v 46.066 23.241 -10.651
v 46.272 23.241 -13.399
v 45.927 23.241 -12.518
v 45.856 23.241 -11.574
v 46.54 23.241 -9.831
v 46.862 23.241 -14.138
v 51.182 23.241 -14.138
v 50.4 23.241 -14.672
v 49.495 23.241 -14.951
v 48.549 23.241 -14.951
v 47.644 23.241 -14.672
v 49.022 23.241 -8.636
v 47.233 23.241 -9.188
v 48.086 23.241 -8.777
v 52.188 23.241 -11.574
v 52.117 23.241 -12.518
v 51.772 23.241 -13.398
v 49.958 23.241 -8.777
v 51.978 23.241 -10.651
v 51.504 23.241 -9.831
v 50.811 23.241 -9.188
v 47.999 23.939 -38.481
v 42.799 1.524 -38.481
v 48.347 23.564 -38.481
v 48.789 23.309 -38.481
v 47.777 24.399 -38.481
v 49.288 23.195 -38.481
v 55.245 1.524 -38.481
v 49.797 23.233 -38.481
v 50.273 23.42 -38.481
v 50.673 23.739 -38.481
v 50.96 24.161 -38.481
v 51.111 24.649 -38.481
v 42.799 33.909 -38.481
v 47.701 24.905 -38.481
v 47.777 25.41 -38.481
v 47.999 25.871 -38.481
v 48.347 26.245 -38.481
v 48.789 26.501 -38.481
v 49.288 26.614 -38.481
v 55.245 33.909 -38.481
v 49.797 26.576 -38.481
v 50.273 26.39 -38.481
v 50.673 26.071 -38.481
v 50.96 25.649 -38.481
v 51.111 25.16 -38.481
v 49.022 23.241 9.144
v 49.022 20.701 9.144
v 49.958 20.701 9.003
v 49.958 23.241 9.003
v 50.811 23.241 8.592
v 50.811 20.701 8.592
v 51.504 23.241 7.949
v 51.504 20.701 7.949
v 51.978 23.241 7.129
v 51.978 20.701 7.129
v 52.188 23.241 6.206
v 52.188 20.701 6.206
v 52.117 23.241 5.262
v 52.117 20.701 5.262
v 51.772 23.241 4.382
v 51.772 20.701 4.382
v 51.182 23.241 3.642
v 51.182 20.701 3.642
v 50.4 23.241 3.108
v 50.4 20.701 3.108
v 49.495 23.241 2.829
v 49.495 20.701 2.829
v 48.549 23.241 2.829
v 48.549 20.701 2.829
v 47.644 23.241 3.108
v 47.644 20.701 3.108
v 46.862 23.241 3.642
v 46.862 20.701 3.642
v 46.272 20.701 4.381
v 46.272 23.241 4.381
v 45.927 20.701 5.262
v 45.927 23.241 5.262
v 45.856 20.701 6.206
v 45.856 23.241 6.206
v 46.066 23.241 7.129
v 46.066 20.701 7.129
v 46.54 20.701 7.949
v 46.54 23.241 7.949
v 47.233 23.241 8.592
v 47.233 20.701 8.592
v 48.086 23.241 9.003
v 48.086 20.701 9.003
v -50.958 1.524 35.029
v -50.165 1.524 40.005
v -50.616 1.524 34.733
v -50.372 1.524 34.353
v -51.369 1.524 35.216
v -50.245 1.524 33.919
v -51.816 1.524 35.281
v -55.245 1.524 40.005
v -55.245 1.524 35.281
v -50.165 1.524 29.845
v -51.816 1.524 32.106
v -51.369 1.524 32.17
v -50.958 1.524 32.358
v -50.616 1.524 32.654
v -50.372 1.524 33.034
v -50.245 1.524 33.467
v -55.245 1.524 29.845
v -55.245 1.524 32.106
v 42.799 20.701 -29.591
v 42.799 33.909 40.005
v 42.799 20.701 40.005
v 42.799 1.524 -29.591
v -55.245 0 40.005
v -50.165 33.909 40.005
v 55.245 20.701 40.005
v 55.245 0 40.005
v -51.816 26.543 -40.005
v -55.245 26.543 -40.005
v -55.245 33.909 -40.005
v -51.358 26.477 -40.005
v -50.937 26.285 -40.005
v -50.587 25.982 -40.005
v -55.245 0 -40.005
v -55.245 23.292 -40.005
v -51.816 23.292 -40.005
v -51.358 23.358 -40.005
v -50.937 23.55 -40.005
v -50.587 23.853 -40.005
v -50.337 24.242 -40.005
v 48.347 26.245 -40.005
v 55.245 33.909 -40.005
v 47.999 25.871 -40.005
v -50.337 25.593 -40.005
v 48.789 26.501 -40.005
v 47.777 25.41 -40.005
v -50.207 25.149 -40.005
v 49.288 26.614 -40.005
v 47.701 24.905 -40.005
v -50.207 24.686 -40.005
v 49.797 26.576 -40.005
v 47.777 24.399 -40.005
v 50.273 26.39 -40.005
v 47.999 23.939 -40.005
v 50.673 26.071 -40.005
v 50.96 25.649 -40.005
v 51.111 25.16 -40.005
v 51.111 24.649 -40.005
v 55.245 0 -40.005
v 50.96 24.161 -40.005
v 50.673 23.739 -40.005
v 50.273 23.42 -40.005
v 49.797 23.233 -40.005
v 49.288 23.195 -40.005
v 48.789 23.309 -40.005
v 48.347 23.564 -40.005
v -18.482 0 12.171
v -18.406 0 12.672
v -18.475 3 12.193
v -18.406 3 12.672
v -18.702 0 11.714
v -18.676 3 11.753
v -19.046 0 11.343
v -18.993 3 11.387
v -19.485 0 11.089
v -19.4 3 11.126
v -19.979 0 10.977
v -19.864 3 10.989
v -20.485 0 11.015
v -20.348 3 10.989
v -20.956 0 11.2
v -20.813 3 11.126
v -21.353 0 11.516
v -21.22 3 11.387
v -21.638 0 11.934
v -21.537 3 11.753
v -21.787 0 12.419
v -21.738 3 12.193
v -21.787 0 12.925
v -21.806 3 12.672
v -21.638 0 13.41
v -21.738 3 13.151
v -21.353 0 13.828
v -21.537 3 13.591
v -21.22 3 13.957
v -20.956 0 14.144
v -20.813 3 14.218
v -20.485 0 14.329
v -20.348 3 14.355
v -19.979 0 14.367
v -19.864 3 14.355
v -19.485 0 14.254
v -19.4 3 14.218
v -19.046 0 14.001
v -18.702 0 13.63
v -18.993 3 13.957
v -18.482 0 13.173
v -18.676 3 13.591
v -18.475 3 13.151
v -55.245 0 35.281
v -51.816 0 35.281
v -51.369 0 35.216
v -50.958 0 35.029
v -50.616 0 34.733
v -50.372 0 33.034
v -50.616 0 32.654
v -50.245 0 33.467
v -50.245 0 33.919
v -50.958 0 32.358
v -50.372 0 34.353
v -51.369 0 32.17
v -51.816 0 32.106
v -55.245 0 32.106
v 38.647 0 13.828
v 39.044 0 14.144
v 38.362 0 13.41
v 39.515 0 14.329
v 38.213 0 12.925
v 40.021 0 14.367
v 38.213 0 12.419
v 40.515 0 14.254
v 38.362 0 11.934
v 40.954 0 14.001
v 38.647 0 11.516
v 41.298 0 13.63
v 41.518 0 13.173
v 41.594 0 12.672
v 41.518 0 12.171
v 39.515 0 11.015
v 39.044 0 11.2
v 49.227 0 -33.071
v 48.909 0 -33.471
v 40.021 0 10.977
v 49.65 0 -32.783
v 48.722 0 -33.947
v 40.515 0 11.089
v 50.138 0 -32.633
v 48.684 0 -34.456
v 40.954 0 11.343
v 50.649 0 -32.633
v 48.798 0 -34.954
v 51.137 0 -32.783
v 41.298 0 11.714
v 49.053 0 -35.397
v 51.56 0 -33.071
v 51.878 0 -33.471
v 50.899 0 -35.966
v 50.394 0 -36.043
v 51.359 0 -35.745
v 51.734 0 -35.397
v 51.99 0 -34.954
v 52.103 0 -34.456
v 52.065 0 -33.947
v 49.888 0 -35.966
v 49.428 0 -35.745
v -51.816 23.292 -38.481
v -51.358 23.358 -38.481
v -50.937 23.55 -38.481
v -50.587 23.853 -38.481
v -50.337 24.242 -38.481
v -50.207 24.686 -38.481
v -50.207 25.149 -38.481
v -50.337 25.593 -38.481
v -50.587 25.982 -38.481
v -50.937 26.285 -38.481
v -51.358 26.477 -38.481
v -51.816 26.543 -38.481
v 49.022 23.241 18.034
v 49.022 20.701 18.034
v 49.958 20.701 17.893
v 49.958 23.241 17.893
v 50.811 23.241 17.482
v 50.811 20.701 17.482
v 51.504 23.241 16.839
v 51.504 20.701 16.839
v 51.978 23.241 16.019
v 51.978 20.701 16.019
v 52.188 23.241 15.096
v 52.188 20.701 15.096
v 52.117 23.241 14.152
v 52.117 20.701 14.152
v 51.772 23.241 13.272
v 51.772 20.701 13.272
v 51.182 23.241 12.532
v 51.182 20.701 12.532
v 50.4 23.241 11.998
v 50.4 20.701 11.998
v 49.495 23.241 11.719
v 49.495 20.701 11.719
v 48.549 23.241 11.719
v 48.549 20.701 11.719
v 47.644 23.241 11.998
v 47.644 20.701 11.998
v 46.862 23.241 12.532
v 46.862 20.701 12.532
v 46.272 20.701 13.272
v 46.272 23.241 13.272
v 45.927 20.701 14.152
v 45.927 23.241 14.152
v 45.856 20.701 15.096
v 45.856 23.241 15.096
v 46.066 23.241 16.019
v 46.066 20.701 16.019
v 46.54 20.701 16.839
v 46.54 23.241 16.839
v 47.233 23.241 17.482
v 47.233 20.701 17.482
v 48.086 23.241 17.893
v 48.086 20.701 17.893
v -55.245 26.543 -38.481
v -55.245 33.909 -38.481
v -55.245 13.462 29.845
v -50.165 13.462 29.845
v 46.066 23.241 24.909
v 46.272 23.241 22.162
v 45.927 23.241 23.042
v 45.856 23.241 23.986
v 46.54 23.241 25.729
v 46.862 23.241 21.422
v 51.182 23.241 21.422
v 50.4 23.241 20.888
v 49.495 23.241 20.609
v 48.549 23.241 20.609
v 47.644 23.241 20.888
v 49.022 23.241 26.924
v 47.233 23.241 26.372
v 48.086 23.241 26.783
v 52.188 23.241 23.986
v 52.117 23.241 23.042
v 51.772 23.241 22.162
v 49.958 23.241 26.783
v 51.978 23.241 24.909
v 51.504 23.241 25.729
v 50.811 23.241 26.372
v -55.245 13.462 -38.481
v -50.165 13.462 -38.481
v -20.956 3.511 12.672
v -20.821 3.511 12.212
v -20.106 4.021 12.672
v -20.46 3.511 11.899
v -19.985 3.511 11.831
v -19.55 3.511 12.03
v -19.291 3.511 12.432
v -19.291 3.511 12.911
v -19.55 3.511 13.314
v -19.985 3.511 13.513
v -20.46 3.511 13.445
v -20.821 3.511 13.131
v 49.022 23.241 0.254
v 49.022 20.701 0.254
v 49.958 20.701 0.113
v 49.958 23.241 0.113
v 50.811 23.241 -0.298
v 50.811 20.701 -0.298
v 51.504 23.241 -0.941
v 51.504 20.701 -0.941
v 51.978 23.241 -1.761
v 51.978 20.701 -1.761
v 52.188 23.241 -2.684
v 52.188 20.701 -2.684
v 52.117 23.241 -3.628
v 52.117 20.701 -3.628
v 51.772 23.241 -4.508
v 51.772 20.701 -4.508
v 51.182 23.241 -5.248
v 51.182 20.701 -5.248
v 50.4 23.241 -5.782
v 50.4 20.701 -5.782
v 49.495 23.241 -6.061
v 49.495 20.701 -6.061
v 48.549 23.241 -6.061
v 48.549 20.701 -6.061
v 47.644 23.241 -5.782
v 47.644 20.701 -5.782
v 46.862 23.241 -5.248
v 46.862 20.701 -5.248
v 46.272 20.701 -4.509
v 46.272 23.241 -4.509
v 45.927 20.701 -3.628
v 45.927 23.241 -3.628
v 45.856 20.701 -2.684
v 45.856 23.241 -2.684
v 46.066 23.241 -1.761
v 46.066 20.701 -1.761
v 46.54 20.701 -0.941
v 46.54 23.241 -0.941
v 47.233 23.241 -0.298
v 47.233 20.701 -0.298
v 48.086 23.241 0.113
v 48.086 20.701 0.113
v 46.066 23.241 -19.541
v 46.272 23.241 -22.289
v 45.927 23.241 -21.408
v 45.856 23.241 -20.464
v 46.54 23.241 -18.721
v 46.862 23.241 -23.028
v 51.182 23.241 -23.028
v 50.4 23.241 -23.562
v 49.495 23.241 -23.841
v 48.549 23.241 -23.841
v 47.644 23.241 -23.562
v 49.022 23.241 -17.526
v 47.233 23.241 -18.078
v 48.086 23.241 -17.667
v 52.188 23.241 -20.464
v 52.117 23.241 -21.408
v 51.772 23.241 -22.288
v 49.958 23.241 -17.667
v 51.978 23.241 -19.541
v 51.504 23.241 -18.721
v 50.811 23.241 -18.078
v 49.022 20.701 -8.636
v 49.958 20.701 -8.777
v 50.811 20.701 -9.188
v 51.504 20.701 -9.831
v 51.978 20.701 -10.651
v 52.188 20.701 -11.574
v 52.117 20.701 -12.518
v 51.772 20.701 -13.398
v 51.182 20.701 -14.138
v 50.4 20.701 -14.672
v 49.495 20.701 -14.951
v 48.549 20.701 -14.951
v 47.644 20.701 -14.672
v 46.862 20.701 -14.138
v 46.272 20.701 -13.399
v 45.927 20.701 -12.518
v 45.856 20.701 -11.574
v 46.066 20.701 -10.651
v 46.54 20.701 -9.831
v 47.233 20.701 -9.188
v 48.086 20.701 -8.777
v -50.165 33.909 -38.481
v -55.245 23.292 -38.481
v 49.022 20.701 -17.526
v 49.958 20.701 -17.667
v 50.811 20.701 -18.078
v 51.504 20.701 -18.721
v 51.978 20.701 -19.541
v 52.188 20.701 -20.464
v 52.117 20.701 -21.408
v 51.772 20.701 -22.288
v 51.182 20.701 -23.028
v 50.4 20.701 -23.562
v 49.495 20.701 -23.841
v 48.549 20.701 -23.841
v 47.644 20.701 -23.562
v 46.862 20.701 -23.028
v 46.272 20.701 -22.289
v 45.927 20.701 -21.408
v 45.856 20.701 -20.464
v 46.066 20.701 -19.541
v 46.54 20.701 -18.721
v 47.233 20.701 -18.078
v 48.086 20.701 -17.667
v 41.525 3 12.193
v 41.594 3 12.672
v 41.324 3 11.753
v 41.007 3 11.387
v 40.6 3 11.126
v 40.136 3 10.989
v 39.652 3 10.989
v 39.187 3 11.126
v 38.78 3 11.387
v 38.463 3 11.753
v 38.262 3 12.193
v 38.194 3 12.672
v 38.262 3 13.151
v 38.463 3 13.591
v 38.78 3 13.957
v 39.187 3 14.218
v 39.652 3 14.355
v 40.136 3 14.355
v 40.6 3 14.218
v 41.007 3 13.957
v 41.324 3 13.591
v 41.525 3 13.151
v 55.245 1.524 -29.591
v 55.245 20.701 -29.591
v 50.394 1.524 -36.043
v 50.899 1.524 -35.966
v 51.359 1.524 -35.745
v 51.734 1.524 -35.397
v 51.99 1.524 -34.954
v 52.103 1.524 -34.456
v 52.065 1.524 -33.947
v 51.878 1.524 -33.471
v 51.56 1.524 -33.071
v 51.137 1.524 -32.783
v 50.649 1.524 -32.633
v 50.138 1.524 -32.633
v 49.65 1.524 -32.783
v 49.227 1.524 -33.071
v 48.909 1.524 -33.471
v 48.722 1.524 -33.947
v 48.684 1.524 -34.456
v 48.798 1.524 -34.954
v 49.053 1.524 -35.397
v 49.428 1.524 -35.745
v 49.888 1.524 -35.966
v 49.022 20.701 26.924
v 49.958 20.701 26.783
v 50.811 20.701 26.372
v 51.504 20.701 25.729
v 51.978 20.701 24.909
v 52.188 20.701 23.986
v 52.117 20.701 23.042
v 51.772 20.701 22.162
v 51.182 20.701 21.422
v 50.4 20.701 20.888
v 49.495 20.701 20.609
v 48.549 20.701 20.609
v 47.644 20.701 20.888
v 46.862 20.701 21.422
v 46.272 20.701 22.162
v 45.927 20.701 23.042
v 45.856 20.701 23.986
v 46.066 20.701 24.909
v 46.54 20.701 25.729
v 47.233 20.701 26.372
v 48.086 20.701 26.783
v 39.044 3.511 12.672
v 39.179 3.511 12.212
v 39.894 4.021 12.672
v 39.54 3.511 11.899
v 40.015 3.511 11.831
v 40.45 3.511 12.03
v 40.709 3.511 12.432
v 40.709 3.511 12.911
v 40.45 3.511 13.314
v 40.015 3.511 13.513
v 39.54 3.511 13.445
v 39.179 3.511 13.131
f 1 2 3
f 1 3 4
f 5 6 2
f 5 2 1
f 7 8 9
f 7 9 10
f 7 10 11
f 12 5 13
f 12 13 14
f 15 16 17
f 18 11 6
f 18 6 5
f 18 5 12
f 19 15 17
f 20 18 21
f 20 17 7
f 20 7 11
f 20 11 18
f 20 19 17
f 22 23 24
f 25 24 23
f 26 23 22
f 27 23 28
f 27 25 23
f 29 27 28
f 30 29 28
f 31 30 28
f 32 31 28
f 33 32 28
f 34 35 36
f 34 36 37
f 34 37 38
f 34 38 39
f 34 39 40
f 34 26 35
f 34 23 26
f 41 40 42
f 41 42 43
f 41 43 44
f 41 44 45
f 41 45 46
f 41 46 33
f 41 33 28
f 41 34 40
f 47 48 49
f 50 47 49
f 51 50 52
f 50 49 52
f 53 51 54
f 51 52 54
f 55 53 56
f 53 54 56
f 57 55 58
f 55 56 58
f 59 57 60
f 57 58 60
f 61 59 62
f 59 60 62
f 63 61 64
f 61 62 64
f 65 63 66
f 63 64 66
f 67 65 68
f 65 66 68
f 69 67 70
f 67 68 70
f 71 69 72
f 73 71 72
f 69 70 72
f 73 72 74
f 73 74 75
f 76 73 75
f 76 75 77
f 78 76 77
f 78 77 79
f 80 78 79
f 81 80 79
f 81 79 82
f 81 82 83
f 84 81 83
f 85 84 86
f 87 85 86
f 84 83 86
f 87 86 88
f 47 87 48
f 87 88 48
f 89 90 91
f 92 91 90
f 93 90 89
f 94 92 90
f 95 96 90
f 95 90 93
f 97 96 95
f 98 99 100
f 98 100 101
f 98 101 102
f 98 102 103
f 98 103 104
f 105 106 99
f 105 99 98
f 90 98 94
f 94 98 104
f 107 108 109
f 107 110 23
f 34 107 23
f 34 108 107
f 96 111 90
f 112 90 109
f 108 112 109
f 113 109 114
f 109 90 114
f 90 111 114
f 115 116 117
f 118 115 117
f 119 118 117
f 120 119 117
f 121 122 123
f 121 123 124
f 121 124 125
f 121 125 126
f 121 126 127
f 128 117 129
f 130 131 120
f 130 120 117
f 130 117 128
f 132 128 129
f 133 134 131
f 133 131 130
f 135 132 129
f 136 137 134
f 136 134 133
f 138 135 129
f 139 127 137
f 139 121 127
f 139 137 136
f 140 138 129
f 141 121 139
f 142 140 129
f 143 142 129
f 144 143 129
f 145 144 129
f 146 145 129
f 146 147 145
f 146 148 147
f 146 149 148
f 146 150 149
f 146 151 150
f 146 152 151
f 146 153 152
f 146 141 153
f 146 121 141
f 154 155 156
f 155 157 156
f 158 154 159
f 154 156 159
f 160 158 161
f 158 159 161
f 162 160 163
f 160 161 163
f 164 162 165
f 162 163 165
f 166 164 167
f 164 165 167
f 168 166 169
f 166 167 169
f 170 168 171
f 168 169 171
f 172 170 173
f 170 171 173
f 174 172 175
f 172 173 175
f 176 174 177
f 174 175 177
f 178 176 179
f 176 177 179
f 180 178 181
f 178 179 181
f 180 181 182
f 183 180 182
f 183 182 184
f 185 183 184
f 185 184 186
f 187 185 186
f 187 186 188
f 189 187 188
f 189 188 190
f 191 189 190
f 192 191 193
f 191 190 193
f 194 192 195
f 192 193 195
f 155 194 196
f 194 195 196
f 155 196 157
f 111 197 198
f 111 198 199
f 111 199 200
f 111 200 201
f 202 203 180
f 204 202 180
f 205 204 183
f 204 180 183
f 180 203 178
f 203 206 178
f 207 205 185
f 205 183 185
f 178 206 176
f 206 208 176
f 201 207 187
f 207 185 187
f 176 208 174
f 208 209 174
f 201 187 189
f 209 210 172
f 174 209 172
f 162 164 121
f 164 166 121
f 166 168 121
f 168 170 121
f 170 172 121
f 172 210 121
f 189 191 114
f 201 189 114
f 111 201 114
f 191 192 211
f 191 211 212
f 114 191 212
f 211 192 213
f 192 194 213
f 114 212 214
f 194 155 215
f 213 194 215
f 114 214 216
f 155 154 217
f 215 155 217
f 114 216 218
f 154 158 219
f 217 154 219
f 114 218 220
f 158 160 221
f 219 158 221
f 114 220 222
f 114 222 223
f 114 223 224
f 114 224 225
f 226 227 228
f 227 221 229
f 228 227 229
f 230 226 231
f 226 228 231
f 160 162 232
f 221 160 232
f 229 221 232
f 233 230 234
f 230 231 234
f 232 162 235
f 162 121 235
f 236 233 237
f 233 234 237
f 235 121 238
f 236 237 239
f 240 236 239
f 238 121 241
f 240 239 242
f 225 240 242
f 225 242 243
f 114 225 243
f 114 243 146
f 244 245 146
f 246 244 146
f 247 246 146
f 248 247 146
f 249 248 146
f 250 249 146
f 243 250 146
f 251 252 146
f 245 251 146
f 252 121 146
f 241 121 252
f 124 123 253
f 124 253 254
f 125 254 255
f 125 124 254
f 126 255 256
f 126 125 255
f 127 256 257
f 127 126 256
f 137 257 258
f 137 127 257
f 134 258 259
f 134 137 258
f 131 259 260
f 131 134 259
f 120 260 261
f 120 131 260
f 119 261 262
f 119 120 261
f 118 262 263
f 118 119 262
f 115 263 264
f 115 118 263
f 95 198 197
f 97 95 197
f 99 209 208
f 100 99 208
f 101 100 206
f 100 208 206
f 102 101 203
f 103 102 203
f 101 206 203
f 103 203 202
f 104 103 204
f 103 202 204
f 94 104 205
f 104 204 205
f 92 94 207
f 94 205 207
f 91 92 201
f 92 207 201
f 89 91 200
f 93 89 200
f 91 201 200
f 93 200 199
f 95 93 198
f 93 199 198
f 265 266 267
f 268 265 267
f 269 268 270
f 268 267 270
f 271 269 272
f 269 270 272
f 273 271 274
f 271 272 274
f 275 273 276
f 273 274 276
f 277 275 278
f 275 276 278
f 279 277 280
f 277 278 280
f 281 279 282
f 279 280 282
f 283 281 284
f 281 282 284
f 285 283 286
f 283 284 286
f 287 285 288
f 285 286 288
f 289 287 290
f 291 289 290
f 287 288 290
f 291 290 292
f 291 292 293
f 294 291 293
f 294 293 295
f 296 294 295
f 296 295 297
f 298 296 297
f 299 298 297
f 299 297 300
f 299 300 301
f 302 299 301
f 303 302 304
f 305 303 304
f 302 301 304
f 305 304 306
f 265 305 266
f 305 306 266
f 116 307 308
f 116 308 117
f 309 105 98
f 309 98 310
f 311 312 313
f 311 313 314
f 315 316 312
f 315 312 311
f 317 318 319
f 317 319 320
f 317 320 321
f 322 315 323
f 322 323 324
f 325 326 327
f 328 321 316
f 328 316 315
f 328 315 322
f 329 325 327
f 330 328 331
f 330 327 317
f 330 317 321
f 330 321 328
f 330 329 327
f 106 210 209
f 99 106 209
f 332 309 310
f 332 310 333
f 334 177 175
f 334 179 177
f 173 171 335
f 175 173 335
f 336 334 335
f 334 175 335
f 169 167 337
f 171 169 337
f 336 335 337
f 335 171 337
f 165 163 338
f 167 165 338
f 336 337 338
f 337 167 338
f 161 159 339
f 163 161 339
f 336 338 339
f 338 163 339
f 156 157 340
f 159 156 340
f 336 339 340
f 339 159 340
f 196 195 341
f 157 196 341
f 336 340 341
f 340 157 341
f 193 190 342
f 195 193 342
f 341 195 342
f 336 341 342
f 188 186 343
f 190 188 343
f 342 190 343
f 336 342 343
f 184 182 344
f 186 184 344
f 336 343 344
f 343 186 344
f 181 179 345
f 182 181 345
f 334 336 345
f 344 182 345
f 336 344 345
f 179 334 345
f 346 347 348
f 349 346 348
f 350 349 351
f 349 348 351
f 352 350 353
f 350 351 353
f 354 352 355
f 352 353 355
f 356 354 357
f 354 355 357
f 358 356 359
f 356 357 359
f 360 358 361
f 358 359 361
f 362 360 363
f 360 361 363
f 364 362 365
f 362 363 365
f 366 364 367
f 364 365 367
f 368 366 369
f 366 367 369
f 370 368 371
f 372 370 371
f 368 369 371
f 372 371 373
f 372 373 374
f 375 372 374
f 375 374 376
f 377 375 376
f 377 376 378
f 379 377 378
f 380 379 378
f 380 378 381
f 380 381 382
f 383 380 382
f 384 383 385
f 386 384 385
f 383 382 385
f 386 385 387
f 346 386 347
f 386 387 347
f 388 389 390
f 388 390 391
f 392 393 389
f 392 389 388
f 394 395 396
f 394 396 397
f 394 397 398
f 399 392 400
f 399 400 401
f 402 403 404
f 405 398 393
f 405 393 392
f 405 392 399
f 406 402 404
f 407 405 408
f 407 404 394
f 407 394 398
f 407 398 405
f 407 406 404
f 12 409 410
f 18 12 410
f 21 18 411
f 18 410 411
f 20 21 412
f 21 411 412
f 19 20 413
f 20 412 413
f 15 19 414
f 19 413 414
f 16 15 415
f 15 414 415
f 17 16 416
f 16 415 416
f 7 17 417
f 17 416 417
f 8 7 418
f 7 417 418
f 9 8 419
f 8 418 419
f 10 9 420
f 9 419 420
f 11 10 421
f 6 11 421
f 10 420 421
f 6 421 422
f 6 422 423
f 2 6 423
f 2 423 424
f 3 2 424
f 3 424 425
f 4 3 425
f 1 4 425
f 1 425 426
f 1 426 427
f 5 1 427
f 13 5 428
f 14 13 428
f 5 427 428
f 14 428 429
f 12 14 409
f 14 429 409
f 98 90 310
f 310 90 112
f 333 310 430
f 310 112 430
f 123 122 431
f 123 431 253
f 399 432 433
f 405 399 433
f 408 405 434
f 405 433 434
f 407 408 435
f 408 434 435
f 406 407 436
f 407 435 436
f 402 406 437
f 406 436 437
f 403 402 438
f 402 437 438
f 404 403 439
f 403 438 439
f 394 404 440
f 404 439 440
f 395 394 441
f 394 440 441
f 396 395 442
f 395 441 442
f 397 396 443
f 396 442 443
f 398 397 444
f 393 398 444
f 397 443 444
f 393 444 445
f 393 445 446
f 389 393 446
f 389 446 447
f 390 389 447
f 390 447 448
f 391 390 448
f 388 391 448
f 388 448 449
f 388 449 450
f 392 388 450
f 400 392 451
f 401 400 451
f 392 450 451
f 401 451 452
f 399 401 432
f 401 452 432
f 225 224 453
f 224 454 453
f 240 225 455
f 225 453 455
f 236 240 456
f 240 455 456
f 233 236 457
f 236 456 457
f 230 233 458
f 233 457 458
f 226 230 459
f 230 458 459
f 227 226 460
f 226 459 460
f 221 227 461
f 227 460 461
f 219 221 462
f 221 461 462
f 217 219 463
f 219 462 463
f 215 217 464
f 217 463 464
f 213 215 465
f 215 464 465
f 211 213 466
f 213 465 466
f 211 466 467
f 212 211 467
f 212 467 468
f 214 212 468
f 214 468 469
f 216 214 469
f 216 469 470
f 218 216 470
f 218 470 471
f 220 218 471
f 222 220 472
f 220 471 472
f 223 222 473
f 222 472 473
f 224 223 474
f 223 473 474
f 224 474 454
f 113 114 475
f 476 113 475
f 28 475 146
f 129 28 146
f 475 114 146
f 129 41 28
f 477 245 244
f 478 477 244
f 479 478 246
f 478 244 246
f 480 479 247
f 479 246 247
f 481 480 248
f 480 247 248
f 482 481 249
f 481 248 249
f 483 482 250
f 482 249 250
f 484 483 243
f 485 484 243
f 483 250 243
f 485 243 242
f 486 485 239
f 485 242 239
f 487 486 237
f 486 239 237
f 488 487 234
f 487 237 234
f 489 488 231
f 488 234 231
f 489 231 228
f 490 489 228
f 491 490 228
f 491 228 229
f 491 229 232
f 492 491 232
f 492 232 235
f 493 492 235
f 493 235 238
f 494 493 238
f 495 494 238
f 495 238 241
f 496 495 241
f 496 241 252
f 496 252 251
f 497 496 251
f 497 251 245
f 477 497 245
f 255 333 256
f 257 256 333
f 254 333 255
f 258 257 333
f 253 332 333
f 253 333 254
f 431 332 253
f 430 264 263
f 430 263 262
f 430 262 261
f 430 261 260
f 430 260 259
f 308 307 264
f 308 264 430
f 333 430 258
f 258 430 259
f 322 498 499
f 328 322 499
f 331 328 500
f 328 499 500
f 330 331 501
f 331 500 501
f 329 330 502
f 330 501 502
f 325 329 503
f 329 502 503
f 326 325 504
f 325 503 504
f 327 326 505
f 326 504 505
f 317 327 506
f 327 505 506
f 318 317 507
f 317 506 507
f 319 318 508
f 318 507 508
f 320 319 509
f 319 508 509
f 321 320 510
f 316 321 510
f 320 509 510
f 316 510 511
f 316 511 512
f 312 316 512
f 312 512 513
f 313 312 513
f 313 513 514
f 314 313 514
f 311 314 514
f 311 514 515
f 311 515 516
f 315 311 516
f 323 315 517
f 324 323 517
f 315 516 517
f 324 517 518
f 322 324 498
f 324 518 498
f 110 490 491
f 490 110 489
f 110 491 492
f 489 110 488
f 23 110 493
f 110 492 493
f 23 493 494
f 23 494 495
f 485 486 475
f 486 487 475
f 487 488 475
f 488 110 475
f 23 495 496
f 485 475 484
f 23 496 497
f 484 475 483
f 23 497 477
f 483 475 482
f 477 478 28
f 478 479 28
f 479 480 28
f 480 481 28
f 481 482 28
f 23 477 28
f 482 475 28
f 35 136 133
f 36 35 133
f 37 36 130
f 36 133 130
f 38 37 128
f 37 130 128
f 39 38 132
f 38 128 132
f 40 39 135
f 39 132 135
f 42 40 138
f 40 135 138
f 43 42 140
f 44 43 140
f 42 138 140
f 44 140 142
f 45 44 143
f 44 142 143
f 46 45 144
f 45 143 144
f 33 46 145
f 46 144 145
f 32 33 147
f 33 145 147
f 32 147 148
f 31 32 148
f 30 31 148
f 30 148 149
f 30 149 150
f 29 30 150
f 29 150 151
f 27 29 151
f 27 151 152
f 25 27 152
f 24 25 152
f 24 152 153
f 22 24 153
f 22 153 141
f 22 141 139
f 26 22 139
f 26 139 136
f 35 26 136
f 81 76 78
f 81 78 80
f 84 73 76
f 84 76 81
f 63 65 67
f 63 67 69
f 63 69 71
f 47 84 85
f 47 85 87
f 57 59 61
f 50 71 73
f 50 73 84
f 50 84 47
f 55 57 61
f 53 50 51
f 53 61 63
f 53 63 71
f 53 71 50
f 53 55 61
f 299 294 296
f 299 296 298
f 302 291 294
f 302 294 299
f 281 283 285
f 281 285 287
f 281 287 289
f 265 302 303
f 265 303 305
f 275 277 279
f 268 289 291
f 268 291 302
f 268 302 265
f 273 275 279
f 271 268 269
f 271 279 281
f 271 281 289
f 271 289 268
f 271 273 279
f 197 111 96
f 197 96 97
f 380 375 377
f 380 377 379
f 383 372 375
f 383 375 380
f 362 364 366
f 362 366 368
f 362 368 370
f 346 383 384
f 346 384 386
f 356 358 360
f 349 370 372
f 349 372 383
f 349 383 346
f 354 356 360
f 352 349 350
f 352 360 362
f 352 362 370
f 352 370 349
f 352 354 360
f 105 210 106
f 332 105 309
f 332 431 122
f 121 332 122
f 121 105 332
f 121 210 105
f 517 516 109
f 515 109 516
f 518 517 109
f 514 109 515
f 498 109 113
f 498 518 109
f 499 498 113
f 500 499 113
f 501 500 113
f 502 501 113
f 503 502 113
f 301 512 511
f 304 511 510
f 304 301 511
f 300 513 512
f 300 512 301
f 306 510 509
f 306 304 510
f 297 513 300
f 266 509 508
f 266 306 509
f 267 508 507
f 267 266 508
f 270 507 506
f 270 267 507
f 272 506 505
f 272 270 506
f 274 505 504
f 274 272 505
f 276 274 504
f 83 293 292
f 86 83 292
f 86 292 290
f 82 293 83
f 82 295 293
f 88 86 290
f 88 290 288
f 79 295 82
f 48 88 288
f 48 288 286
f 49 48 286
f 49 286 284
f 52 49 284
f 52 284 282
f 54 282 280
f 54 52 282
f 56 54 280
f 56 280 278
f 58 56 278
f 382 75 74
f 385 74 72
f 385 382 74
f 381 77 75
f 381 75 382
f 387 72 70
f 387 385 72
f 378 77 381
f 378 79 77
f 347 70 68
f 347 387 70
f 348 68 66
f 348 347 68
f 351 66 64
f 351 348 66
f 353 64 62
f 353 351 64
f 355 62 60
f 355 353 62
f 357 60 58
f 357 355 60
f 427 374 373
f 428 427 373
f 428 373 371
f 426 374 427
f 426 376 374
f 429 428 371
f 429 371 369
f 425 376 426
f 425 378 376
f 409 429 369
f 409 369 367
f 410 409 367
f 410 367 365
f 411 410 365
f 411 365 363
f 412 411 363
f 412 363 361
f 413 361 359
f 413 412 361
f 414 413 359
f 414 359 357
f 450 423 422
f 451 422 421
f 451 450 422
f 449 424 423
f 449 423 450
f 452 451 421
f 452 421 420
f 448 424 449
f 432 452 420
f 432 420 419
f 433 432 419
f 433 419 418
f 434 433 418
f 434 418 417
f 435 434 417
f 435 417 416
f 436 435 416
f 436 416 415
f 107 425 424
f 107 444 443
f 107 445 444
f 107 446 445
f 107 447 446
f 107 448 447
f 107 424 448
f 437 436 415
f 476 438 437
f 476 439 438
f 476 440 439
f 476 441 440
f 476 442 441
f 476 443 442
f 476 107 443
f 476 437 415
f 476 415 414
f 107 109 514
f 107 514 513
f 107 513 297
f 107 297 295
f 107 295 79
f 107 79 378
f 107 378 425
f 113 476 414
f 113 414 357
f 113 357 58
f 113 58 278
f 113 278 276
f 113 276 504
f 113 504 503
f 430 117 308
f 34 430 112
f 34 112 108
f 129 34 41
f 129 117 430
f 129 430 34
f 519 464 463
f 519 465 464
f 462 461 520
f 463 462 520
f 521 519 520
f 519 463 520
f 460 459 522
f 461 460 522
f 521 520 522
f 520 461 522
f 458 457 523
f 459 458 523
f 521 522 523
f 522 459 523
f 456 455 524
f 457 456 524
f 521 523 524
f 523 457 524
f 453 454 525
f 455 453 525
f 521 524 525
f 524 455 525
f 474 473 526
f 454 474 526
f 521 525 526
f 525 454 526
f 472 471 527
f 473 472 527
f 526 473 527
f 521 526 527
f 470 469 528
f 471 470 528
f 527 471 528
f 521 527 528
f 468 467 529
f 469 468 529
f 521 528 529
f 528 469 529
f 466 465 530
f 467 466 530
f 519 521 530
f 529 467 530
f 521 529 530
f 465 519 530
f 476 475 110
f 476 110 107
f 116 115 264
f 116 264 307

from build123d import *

# Parameters (mm, degrees)
SKETCH1_W                = 110.49
SKETCH1_H                = 80.01
BOSS_EXTRUDE1_DEPTH      = 33.909
SKETCH2_W                = 12.446
SKETCH2_H                = 78.486
CUT_EXTRUDE1_DEPTH       = 13.208
SKETCH3_W                = 8.89
SKETCH3_H                = 19.177
CUT_EXTRUDE2_DEPTH       = 12.446
CUT_EXTRUDE5_DEPTH       = 5.08
CUT_EXTRUDE3_REACH       = 104.973
SKETCH4_R                = 1.7145
SKETCH5_R                = 1.7145
CUT_EXTRUDE4_DEPTH       = 77.172372492
SKETCH8_R                = 3.175
BOSS_EXTRUDE2_DEPTH      = 2.54
LPATTERN1_COUNT          = 6
LPATTERN1_PITCH          = 8.89
M3_CLEARANCE_HOLE1_D     = 3.4
M3_CLEARANCE_HOLE1_DEPTH = 2.999994
M3_CLEARANCE_HOLE1_TIP   = 1.021463052


with BuildPart() as part:
    # Sketch1 → Boss-Extrude1 (new body)
    with BuildSketch(Plane(origin=(0, 0, 0), x_dir=(1, 0, 0), z_dir=(0, 1, 0))):
        Rectangle(SKETCH1_W, SKETCH1_H)
    extrude(amount=BOSS_EXTRUDE1_DEPTH)

    # Sketch2 → Cut-Extrude1 (cut)
    with BuildSketch(Plane(origin=(0, 33.909, 0), x_dir=(1, 0, 0), z_dir=(0, 1, 0))):
        with Locations((49.022, -0.762)):
            Rectangle(SKETCH2_W, SKETCH2_H)
    extrude(amount=-CUT_EXTRUDE1_DEPTH, mode=Mode.SUBTRACT)

    # Sketch3 → Cut-Extrude2 (cut)
    with BuildSketch(Plane(origin=(55.245, 0, 0), x_dir=(0, 0, -1), z_dir=(1, 0, 0))):
        with Locations((34.036, 11.1125)):
            Rectangle(SKETCH3_W, SKETCH3_H)
    extrude(amount=-CUT_EXTRUDE2_DEPTH, mode=Mode.SUBTRACT)

    # Sketch6 → Cut-Extrude5 (cut)
    with BuildSketch(Plane.ZY.offset(55.245)):
        Polygon((-38.481, 33.909), (40.005, 33.909), (40.005, 1.524), (29.845, 1.524), (29.845, 13.462), (-38.481, 13.462), align=None)
    extrude(amount=-CUT_EXTRUDE5_DEPTH, mode=Mode.SUBTRACT)

    # Sketch4 → Cut-Extrude3 (cut, up to next)
    with BuildSketch(Plane(origin=(0, 0, -40.005), x_dir=(-1, 0, 0), z_dir=(0, 0, -1)), mode=Mode.PRIVATE) as cut_extrude3_sk1:
        with Locations((-49.4157, 24.9047)):
            Circle(SKETCH4_R)
    cut_extrude3_tool1 = extrude(cut_extrude3_sk1.sketch, amount=-CUT_EXTRUDE3_REACH, mode=Mode.PRIVATE) & part.part
    # Sketch4 → Cut-Extrude3 (cut, up to next)
    with BuildSketch(Plane(origin=(0, 0, -40.005), x_dir=(-1, 0, 0), z_dir=(0, 0, -1)), mode=Mode.PRIVATE) as cut_extrude3_sk2:
        with BuildLine():
            Line((51.816, 26.543), (55.245, 26.543))
            Line((55.245, 26.543), (55.245, 23.2918))
            Line((55.245, 23.2918), (51.816, 23.2918))
            ThreePointArc((51.816, 23.2918), (50.1904, 24.9174), (51.816, 26.543))
        make_face()
    cut_extrude3_tool2 = extrude(cut_extrude3_sk2.sketch, amount=-CUT_EXTRUDE3_REACH, mode=Mode.PRIVATE) & part.part
    add(cut_extrude3_tool1.solids().sort_by_distance((49.4157, 24.9047, -40.005))[0], mode=Mode.SUBTRACT)
    add(cut_extrude3_tool2.solids().sort_by_distance((-52.878141, 24.9174, -40.005))[0], mode=Mode.SUBTRACT)

    # Sketch5 → Cut-Extrude4 (cut, through all)
    with BuildSketch(Plane(origin=(0, 0, 0), x_dir=(-1, 0, 0), z_dir=(0, -1, 0))):
        with Locations(Location((-50.3936, 34.3281, 0), (0, 0, 90))):
            Circle(SKETCH5_R)
        with BuildLine():
            Line((51.816, -35.2806), (55.245, -35.2806))
            Line((55.245, -35.2806), (55.245, -32.1056))
            Line((55.245, -32.1056), (51.816, -32.1056))
            ThreePointArc((51.816, -32.1056), (50.2285, -33.6931), (51.816, -35.2806))
        make_face()
    extrude(amount=-CUT_EXTRUDE4_DEPTH, mode=Mode.SUBTRACT)

    # Sketch8 → Boss-Extrude2 (add)
    with BuildSketch(Plane(origin=(0, 20.701, 0), x_dir=(1, 0, 0), z_dir=(0, 1, 0))):
        with Locations(Location((49.022, 20.701, 0), (0, 0, 270))):
            Circle(SKETCH8_R)
    boss_extrude2 = extrude(amount=BOSS_EXTRUDE2_DEPTH)

    # LPattern1: Boss-Extrude2 ×6
    with Locations(*[(0, 0, i * LPATTERN1_PITCH) for i in range(1, LPATTERN1_COUNT)]):
        add(boss_extrude2)

    # M3 Clearance Hole1
    with Locations(Plane(origin=(0, 0, 0), x_dir=(-1, 0, 0), z_dir=(0, -1, 0))):
        with Locations((-39.8936, -12.6719), (20.1064, -12.6719)):
            Hole(M3_CLEARANCE_HOLE1_D / 2, depth=M3_CLEARANCE_HOLE1_DEPTH)
            with Locations((0, 0, -(M3_CLEARANCE_HOLE1_DEPTH + M3_CLEARANCE_HOLE1_TIP / 2))):  # 118° drill point
                Cone(0, M3_CLEARANCE_HOLE1_D / 2, M3_CLEARANCE_HOLE1_TIP, mode=Mode.SUBTRACT)


solid = part.part
